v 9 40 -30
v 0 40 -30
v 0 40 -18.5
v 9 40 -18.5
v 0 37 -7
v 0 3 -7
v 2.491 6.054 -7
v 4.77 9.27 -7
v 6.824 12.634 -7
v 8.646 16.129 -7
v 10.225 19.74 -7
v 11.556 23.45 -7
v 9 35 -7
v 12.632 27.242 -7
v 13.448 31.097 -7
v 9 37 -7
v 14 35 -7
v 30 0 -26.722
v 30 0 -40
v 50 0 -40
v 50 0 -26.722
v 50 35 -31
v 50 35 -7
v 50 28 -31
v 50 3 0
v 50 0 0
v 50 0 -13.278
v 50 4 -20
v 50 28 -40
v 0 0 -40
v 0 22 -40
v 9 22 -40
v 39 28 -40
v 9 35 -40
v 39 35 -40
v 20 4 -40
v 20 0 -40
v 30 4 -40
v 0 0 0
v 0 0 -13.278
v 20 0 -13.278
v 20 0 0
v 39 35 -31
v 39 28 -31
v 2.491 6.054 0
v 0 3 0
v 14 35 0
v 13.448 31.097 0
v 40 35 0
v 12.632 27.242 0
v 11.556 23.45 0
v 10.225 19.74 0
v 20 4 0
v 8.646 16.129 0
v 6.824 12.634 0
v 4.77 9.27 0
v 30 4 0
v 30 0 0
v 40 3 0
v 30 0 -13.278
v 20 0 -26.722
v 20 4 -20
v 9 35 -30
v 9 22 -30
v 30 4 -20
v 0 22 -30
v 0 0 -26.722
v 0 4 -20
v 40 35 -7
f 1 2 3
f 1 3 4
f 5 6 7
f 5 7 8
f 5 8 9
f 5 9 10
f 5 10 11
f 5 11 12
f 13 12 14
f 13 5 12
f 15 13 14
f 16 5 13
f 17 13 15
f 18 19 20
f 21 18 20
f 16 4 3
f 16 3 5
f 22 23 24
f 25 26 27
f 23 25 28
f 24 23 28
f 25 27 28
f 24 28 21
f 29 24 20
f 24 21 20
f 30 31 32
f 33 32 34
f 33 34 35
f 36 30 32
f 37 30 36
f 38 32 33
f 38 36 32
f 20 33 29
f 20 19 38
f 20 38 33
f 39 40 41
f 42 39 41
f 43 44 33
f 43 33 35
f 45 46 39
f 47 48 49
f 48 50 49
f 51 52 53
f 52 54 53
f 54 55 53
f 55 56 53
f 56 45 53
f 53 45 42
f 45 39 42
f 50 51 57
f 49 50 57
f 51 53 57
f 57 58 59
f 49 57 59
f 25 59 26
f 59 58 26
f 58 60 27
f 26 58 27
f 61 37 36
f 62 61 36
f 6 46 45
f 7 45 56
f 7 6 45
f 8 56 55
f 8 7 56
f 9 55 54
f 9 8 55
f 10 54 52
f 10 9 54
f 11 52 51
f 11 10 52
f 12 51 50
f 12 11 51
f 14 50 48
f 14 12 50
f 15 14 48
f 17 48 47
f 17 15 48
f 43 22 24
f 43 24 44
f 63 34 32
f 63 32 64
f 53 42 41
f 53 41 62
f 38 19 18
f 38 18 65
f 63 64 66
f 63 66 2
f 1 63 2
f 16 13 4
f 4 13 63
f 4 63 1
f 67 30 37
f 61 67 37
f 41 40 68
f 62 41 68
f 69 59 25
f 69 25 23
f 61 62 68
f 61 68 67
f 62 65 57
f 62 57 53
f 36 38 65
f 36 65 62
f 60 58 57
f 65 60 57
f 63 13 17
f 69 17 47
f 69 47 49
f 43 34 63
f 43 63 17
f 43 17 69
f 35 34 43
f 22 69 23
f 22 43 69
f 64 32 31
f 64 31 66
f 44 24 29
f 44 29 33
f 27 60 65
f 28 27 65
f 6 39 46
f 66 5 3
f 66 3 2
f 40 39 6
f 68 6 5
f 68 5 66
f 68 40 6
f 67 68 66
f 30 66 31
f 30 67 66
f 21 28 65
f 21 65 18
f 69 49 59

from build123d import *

# Parameters (mm, degrees)
SKETCH_1_W               = 50
SKETCH_1_H               = 40
EXTRUDE_1_DEPTH          = 40
CUT_EXTRUDE_1_DEPTH      = 76.498344353
CUT_EXTRUDE_1_DEPTH_BACK = 76.498344353
SKETCH_4_W               = 5
SKETCH_4_H               = 4
CUT_EXTRUDE_3_DEPTH      = 76.498344353
CUT_EXTRUDE_3_DEPTH_BACK = 76.498344353
CUT_EXTRUDE_4_DEPTH      = 76.498344353
CUT_EXTRUDE_4_DEPTH_BACK = 76.498344353
SKETCH_6_W               = 41
SKETCH_6_H               = 5
CUT_EXTRUDE_5_DEPTH      = 76.498344353
CUT_EXTRUDE_5_DEPTH_BACK = 7
CUT_EXTRUDE_6_DEPTH      = 76.498344353
CUT_EXTRUDE_6_DEPTH_BACK = 10
CUT_EXTRUDE_7_DEPTH      = 76.498344353
CUT_EXTRUDE_7_DEPTH_BACK = 9
CUT_EXTRUDE_8_DEPTH      = 76.498344353
CUT_EXTRUDE_8_DEPTH_BACK = 9
CUT_EXTRUDE_9_DEPTH      = 76.498344353
CUT_EXTRUDE_9_DEPTH_BACK = 9
SKETCH_15_W              = 11
SKETCH_15_H              = 7


with BuildPart() as part:
    # Эскиз1 → Бобышка-Вытянуть1 (new body)
    with BuildSketch(Plane(origin=(0, 0, 0), x_dir=(1, 0, 0), z_dir=(0, 1, 0))):
        with Locations((25, 20)):
            Rectangle(SKETCH_1_W, SKETCH_1_H)
    extrude(amount=EXTRUDE_1_DEPTH)

    # Эскиз4 → Вырез-Вытянуть1 (cut, two sides: drawn at the far end of the back side and taken through both)
    with BuildSketch(Plane.XY.offset(-CUT_EXTRUDE_1_DEPTH_BACK)):
        with Locations((22.5, 2)):
            Rectangle(SKETCH_4_W, SKETCH_4_H)
        with Locations((27.5, 2)):
            Rectangle(SKETCH_4_W, SKETCH_4_H)
    extrude(amount=CUT_EXTRUDE_1_DEPTH + CUT_EXTRUDE_1_DEPTH_BACK, mode=Mode.SUBTRACT)

    # Эскиз5 → Вырез-Вытянуть3 (cut, two sides: drawn at the far end of the back side and taken through both)
    with BuildSketch(Plane.ZY.offset(-CUT_EXTRUDE_3_DEPTH_BACK)):
        Polygon((-20, 4), (-26.721648091, 0), (-13.278351909, 0), align=None)
    extrude(amount=CUT_EXTRUDE_3_DEPTH + CUT_EXTRUDE_3_DEPTH_BACK, mode=Mode.SUBTRACT)

    # Эскиз6 → Вырез-Вытянуть4 (cut, two sides: drawn at the far end of the back side and taken through both)
    with BuildSketch(Plane.XY.offset(-CUT_EXTRUDE_4_DEPTH_BACK)):
        with Locations((29.5, 37.5)):
            Rectangle(SKETCH_6_W, SKETCH_6_H)
    extrude(amount=CUT_EXTRUDE_4_DEPTH + CUT_EXTRUDE_4_DEPTH_BACK, mode=Mode.SUBTRACT)

    # Эскиз8 → Вырез-Вытянуть5 (cut, two sides: drawn at the far end of the back side and taken through both)
    with BuildSketch(Plane.XY.offset(-CUT_EXTRUDE_5_DEPTH_BACK)):
        with BuildLine():
            ThreePointArc((0, 3), (9.466087362, 17.921086779), (14, 35))
            Line((14, 35), (9, 35))
            Line((9, 35), (9, 40))
            Line((9, 40), (0, 40))
            Line((0, 40), (0, 3))
        make_face()
    extrude(amount=CUT_EXTRUDE_5_DEPTH + CUT_EXTRUDE_5_DEPTH_BACK, mode=Mode.SUBTRACT)

    # Эскиз9 → Вырез-Вытянуть6 (cut, two sides: drawn at the far end of the back side and taken through both)
    with BuildSketch(Plane(origin=(50, 0, 0), x_dir=(0, 0, -1), z_dir=(1, 0, 0)).offset(-CUT_EXTRUDE_6_DEPTH_BACK)):
        Polygon((0, 35), (0, 3), (7, 35), align=None)
    extrude(amount=CUT_EXTRUDE_6_DEPTH + CUT_EXTRUDE_6_DEPTH_BACK, mode=Mode.SUBTRACT)

    # Эскиз11 → Вырез-Вытянуть7 (cut, two sides: drawn at the far end of the back side and taken through both)
    with BuildSketch(Plane.ZY.offset(-CUT_EXTRUDE_7_DEPTH_BACK)):
        Polygon((-150, 22), (-40, 22), (-30, 22), (-30, 40), (-30, 150), (-190.498184911, 300.467048354), (-310.498184911, 172.467048354), align=None)
    extrude(amount=CUT_EXTRUDE_7_DEPTH + CUT_EXTRUDE_7_DEPTH_BACK, mode=Mode.SUBTRACT)

    # Эскиз14 → Вырез-Вытянуть8 (cut, two sides: drawn at the far end of the back side and taken through both)
    with BuildSketch(Plane.ZY.offset(-CUT_EXTRUDE_8_DEPTH_BACK)):
        Polygon((-7, 40), (-18.5, 40), (-7, 37), align=None)
    extrude(amount=CUT_EXTRUDE_8_DEPTH + CUT_EXTRUDE_8_DEPTH_BACK, mode=Mode.SUBTRACT)

    # Эскиз15 → Вырез-Вытянуть9 (cut, two sides: drawn at the far end of the back side and taken through both)
    with BuildSketch(Plane(origin=(0, 0, -40), x_dir=(-1, 0, 0), z_dir=(0, 0, -1)).offset(-CUT_EXTRUDE_9_DEPTH_BACK)):
        with Locations((-44.5, 31.5)):
            Rectangle(SKETCH_15_W, SKETCH_15_H)
    extrude(amount=CUT_EXTRUDE_9_DEPTH + CUT_EXTRUDE_9_DEPTH_BACK, mode=Mode.SUBTRACT)


solid = part.part
